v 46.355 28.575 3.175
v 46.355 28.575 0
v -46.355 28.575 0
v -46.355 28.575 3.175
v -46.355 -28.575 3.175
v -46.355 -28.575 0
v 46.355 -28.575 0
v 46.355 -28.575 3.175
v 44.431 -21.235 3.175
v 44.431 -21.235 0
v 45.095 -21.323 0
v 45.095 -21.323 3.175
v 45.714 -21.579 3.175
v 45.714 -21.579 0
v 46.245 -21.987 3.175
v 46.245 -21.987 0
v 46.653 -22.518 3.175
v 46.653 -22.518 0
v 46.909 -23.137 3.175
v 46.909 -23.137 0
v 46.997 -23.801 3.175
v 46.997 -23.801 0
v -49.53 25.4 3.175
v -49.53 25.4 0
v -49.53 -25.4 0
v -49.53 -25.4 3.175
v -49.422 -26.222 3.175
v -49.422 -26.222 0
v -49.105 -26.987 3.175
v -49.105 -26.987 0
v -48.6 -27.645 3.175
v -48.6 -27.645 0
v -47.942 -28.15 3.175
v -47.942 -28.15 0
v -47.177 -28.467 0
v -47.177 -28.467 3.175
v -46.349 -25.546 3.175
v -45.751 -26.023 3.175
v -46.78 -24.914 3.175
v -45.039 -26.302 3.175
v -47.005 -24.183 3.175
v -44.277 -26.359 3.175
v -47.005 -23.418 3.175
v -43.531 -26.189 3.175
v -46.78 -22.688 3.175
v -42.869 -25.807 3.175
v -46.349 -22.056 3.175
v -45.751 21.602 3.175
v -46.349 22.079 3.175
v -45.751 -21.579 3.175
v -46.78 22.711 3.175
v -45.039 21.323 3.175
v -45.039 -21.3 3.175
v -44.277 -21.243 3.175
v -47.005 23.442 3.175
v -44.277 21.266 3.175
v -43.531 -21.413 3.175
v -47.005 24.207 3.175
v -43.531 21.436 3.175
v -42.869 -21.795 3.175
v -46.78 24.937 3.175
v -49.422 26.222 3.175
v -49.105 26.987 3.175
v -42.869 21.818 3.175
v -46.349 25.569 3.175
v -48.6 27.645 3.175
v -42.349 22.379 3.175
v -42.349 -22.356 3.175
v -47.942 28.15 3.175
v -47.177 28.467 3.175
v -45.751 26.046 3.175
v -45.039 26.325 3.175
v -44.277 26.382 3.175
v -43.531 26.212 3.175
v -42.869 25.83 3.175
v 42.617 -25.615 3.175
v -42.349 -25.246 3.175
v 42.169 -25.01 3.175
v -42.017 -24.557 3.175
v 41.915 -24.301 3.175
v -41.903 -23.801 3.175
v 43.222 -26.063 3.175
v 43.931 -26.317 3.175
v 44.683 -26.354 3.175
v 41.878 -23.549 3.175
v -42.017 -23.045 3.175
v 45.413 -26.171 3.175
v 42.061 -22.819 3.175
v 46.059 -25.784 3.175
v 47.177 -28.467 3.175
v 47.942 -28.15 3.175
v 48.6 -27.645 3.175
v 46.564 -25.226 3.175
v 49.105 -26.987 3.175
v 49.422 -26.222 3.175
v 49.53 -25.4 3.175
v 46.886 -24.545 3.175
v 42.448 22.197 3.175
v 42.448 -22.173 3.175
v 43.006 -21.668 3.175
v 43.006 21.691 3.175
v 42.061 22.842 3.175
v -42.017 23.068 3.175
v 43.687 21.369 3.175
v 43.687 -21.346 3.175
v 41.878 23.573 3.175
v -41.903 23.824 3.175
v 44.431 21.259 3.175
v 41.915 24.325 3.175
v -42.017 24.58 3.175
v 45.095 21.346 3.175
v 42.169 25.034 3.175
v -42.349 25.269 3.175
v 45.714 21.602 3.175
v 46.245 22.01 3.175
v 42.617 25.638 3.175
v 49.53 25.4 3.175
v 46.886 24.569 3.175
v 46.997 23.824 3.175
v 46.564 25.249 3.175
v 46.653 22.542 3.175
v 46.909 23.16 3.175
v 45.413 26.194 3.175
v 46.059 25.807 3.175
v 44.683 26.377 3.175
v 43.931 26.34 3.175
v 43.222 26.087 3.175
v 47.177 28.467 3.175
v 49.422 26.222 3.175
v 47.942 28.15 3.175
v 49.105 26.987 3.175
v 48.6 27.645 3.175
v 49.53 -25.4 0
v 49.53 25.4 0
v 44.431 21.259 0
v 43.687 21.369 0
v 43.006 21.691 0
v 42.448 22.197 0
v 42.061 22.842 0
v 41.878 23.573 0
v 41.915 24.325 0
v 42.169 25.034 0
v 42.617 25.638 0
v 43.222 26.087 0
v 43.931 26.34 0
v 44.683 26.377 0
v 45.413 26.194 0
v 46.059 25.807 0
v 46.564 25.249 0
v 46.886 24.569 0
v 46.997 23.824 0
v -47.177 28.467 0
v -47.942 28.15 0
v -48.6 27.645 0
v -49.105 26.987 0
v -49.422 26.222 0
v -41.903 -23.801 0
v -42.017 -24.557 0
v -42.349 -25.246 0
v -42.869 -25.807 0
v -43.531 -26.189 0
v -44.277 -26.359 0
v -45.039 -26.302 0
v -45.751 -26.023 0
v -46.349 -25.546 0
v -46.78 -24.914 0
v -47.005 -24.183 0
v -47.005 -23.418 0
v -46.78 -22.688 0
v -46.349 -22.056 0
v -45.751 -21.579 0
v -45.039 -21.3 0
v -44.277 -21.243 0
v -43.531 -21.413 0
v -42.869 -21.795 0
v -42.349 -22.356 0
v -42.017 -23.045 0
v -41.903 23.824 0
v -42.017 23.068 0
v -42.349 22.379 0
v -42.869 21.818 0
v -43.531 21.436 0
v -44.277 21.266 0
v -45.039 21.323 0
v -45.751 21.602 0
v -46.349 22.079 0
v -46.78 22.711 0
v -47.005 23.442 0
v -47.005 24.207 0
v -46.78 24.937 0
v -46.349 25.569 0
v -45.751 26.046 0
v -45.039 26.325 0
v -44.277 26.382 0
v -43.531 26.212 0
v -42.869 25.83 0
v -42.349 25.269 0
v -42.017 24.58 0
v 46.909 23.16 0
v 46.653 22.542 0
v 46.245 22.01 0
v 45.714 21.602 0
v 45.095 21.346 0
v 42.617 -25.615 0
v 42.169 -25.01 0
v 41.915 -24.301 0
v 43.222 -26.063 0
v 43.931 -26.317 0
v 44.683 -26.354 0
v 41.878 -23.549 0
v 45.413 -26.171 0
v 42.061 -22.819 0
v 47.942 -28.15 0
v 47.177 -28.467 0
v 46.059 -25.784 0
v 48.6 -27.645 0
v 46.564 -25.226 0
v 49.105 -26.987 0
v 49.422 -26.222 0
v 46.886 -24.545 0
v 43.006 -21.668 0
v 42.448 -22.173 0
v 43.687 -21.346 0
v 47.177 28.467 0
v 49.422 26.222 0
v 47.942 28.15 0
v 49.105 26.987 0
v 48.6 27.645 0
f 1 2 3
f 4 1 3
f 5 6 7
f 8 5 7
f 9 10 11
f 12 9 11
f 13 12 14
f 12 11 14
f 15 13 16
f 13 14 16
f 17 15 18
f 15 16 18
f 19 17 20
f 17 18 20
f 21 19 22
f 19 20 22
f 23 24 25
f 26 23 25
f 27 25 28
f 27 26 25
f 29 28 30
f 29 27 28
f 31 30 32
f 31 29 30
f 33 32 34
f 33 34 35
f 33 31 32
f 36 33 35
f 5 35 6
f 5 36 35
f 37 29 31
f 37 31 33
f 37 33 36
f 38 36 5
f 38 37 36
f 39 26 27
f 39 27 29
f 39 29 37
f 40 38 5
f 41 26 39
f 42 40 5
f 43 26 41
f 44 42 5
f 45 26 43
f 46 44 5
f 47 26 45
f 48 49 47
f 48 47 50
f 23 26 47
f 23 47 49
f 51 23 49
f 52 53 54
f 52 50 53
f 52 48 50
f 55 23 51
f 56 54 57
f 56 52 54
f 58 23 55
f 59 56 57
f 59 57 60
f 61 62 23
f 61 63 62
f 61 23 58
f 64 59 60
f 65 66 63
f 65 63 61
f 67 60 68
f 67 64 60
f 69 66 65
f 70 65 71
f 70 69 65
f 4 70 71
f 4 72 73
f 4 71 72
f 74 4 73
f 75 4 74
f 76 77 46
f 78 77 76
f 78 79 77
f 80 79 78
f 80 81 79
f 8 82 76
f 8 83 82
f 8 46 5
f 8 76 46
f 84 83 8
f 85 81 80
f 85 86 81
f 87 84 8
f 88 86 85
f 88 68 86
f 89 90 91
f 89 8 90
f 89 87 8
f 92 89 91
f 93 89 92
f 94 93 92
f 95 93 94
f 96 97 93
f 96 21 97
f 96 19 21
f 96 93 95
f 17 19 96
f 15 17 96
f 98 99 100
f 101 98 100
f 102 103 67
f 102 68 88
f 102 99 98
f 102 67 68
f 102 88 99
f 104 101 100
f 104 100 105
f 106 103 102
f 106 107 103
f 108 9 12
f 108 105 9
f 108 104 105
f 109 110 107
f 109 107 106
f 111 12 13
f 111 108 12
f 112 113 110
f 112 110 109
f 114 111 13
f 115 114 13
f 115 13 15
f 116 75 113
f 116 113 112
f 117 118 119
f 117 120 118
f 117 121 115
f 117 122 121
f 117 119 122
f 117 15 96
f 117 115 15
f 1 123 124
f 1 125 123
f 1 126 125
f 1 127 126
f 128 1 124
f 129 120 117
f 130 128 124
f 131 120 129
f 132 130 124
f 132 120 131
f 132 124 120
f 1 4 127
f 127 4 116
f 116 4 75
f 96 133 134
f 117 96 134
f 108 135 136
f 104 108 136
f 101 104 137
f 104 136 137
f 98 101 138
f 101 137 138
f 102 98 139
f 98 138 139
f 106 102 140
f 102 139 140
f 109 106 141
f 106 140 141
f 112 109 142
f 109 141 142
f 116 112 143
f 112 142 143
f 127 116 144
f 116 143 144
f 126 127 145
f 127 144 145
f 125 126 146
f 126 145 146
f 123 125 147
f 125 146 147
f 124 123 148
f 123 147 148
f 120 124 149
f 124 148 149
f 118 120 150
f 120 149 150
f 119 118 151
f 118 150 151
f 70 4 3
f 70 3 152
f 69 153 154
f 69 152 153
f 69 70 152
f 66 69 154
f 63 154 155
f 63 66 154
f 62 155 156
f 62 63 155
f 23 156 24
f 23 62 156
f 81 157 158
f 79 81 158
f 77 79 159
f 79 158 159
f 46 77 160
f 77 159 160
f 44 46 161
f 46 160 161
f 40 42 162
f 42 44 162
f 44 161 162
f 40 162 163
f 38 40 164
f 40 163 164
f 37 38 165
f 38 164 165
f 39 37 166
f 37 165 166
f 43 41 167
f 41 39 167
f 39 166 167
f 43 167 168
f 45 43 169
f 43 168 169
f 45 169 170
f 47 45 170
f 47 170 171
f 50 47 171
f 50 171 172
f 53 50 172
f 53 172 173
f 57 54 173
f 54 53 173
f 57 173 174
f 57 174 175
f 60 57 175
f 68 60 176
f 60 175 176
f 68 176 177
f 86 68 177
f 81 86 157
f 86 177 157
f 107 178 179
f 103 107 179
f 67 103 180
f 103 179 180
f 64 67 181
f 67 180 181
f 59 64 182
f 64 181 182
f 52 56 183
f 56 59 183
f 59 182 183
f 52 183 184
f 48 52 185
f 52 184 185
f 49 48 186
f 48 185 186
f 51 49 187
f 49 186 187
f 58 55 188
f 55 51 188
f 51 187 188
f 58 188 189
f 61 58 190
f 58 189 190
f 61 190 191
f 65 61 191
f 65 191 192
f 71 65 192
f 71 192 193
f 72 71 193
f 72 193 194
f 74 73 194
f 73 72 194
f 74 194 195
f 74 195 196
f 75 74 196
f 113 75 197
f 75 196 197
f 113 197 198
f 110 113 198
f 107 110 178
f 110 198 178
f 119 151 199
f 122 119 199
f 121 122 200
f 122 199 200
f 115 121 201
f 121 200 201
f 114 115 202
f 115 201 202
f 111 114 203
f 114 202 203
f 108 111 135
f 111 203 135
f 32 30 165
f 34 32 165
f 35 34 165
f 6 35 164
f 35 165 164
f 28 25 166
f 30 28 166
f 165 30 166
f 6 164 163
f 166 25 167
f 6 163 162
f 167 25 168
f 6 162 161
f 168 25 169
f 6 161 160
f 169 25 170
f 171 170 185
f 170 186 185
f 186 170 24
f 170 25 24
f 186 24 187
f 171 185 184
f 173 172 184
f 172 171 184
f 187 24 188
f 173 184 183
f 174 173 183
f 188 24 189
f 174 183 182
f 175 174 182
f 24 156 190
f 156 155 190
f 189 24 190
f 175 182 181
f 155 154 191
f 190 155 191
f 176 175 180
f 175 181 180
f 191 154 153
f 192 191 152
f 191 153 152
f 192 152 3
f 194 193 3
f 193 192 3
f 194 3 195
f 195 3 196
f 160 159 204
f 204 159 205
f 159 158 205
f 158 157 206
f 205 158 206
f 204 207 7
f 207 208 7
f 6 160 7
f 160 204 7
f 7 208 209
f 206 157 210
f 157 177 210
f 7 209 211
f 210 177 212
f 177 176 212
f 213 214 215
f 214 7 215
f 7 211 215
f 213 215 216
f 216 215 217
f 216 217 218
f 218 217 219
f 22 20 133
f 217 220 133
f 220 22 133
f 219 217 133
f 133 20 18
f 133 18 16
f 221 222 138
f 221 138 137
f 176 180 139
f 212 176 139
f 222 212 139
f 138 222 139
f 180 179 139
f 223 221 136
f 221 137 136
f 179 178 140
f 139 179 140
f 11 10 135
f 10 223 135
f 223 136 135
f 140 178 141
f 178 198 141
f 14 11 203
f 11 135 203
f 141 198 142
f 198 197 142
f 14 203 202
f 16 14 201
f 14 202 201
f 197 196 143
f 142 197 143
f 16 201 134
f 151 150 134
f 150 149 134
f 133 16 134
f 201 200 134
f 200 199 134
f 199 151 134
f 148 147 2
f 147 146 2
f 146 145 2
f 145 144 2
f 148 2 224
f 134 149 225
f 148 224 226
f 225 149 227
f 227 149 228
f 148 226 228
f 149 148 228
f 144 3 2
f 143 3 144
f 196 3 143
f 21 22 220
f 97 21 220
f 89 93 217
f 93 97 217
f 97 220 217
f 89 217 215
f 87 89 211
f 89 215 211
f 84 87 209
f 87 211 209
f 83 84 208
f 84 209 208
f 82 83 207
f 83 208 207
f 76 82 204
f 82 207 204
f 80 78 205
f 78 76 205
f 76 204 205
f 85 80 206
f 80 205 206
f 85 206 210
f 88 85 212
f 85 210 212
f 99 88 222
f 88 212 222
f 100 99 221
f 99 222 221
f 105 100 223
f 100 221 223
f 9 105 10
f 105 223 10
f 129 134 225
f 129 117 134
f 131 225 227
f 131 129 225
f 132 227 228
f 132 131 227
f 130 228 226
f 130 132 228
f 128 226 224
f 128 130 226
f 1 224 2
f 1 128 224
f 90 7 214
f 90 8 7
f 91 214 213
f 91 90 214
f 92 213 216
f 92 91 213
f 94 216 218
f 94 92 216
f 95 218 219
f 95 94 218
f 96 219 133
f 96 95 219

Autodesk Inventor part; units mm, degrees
ref_plane "YZ Plane" through (0, 0, 0) normal (1, 0, 0) x (0, 1, 0)
ref_plane "XZ Plane" through (0, 0, 0) normal (0, 1, 0) x (-1, 0, 0)
ref_plane "XY Plane" through (0, 0, 0) normal (0, 0, 1) x (1, 0, 0)
sketch "Sketch1" plane through (0, 0, 0) normal (0, 0, 1) x (1, 0, 0)
  circle A0 centre (-44.4686, 23.8242) radius 2.5654
  circle A1 centre (44.4314, 23.8242) radius 2.5654
  line L0 (0, 25.1324) -> (0, 21.8881) construction
  circle A2 centre (-44.4686, -23.8008) radius 2.5654
  circle A3 centre (44.4314, -23.8008) radius 2.5654
  line L1 (44.4314, 23.8242) -> (44.4314, -23.8008)
  line L2 (-49.53, -28.575) -> (49.53, -28.575)
  line L3 (49.53, -28.575) -> (49.53, 28.575)
  line L4 (49.53, 28.575) -> (-49.53, 28.575)
  line L5 (-49.53, 28.575) -> (-49.53, -28.575)
  line L6 (-49.53, -28.575) -> (49.53, 28.575) construction
  line L7 (49.53, -28.575) -> (-49.53, 28.575) construction
  point P0 (0, 0)
  dimension "d0" = 5.1308
  dimension "d1" = 5.1308
  dimension "d2" = 88.9
  dimension "d5" = 47.625
  dimension "d10" = 99.06
  dimension "d11" = 57.15
extrude "Extrusion1" add sketch "Sketch1" along normal blind 3.175
fillet "Fillet1" radius 3.175 4 edges at (-49.53, 28.575, 1.5875) (49.53, 28.575, 1.5875) (49.53, -28.575, 1.5875) (-49.53, -28.575, 1.5875)
properties part number "Limelight"
